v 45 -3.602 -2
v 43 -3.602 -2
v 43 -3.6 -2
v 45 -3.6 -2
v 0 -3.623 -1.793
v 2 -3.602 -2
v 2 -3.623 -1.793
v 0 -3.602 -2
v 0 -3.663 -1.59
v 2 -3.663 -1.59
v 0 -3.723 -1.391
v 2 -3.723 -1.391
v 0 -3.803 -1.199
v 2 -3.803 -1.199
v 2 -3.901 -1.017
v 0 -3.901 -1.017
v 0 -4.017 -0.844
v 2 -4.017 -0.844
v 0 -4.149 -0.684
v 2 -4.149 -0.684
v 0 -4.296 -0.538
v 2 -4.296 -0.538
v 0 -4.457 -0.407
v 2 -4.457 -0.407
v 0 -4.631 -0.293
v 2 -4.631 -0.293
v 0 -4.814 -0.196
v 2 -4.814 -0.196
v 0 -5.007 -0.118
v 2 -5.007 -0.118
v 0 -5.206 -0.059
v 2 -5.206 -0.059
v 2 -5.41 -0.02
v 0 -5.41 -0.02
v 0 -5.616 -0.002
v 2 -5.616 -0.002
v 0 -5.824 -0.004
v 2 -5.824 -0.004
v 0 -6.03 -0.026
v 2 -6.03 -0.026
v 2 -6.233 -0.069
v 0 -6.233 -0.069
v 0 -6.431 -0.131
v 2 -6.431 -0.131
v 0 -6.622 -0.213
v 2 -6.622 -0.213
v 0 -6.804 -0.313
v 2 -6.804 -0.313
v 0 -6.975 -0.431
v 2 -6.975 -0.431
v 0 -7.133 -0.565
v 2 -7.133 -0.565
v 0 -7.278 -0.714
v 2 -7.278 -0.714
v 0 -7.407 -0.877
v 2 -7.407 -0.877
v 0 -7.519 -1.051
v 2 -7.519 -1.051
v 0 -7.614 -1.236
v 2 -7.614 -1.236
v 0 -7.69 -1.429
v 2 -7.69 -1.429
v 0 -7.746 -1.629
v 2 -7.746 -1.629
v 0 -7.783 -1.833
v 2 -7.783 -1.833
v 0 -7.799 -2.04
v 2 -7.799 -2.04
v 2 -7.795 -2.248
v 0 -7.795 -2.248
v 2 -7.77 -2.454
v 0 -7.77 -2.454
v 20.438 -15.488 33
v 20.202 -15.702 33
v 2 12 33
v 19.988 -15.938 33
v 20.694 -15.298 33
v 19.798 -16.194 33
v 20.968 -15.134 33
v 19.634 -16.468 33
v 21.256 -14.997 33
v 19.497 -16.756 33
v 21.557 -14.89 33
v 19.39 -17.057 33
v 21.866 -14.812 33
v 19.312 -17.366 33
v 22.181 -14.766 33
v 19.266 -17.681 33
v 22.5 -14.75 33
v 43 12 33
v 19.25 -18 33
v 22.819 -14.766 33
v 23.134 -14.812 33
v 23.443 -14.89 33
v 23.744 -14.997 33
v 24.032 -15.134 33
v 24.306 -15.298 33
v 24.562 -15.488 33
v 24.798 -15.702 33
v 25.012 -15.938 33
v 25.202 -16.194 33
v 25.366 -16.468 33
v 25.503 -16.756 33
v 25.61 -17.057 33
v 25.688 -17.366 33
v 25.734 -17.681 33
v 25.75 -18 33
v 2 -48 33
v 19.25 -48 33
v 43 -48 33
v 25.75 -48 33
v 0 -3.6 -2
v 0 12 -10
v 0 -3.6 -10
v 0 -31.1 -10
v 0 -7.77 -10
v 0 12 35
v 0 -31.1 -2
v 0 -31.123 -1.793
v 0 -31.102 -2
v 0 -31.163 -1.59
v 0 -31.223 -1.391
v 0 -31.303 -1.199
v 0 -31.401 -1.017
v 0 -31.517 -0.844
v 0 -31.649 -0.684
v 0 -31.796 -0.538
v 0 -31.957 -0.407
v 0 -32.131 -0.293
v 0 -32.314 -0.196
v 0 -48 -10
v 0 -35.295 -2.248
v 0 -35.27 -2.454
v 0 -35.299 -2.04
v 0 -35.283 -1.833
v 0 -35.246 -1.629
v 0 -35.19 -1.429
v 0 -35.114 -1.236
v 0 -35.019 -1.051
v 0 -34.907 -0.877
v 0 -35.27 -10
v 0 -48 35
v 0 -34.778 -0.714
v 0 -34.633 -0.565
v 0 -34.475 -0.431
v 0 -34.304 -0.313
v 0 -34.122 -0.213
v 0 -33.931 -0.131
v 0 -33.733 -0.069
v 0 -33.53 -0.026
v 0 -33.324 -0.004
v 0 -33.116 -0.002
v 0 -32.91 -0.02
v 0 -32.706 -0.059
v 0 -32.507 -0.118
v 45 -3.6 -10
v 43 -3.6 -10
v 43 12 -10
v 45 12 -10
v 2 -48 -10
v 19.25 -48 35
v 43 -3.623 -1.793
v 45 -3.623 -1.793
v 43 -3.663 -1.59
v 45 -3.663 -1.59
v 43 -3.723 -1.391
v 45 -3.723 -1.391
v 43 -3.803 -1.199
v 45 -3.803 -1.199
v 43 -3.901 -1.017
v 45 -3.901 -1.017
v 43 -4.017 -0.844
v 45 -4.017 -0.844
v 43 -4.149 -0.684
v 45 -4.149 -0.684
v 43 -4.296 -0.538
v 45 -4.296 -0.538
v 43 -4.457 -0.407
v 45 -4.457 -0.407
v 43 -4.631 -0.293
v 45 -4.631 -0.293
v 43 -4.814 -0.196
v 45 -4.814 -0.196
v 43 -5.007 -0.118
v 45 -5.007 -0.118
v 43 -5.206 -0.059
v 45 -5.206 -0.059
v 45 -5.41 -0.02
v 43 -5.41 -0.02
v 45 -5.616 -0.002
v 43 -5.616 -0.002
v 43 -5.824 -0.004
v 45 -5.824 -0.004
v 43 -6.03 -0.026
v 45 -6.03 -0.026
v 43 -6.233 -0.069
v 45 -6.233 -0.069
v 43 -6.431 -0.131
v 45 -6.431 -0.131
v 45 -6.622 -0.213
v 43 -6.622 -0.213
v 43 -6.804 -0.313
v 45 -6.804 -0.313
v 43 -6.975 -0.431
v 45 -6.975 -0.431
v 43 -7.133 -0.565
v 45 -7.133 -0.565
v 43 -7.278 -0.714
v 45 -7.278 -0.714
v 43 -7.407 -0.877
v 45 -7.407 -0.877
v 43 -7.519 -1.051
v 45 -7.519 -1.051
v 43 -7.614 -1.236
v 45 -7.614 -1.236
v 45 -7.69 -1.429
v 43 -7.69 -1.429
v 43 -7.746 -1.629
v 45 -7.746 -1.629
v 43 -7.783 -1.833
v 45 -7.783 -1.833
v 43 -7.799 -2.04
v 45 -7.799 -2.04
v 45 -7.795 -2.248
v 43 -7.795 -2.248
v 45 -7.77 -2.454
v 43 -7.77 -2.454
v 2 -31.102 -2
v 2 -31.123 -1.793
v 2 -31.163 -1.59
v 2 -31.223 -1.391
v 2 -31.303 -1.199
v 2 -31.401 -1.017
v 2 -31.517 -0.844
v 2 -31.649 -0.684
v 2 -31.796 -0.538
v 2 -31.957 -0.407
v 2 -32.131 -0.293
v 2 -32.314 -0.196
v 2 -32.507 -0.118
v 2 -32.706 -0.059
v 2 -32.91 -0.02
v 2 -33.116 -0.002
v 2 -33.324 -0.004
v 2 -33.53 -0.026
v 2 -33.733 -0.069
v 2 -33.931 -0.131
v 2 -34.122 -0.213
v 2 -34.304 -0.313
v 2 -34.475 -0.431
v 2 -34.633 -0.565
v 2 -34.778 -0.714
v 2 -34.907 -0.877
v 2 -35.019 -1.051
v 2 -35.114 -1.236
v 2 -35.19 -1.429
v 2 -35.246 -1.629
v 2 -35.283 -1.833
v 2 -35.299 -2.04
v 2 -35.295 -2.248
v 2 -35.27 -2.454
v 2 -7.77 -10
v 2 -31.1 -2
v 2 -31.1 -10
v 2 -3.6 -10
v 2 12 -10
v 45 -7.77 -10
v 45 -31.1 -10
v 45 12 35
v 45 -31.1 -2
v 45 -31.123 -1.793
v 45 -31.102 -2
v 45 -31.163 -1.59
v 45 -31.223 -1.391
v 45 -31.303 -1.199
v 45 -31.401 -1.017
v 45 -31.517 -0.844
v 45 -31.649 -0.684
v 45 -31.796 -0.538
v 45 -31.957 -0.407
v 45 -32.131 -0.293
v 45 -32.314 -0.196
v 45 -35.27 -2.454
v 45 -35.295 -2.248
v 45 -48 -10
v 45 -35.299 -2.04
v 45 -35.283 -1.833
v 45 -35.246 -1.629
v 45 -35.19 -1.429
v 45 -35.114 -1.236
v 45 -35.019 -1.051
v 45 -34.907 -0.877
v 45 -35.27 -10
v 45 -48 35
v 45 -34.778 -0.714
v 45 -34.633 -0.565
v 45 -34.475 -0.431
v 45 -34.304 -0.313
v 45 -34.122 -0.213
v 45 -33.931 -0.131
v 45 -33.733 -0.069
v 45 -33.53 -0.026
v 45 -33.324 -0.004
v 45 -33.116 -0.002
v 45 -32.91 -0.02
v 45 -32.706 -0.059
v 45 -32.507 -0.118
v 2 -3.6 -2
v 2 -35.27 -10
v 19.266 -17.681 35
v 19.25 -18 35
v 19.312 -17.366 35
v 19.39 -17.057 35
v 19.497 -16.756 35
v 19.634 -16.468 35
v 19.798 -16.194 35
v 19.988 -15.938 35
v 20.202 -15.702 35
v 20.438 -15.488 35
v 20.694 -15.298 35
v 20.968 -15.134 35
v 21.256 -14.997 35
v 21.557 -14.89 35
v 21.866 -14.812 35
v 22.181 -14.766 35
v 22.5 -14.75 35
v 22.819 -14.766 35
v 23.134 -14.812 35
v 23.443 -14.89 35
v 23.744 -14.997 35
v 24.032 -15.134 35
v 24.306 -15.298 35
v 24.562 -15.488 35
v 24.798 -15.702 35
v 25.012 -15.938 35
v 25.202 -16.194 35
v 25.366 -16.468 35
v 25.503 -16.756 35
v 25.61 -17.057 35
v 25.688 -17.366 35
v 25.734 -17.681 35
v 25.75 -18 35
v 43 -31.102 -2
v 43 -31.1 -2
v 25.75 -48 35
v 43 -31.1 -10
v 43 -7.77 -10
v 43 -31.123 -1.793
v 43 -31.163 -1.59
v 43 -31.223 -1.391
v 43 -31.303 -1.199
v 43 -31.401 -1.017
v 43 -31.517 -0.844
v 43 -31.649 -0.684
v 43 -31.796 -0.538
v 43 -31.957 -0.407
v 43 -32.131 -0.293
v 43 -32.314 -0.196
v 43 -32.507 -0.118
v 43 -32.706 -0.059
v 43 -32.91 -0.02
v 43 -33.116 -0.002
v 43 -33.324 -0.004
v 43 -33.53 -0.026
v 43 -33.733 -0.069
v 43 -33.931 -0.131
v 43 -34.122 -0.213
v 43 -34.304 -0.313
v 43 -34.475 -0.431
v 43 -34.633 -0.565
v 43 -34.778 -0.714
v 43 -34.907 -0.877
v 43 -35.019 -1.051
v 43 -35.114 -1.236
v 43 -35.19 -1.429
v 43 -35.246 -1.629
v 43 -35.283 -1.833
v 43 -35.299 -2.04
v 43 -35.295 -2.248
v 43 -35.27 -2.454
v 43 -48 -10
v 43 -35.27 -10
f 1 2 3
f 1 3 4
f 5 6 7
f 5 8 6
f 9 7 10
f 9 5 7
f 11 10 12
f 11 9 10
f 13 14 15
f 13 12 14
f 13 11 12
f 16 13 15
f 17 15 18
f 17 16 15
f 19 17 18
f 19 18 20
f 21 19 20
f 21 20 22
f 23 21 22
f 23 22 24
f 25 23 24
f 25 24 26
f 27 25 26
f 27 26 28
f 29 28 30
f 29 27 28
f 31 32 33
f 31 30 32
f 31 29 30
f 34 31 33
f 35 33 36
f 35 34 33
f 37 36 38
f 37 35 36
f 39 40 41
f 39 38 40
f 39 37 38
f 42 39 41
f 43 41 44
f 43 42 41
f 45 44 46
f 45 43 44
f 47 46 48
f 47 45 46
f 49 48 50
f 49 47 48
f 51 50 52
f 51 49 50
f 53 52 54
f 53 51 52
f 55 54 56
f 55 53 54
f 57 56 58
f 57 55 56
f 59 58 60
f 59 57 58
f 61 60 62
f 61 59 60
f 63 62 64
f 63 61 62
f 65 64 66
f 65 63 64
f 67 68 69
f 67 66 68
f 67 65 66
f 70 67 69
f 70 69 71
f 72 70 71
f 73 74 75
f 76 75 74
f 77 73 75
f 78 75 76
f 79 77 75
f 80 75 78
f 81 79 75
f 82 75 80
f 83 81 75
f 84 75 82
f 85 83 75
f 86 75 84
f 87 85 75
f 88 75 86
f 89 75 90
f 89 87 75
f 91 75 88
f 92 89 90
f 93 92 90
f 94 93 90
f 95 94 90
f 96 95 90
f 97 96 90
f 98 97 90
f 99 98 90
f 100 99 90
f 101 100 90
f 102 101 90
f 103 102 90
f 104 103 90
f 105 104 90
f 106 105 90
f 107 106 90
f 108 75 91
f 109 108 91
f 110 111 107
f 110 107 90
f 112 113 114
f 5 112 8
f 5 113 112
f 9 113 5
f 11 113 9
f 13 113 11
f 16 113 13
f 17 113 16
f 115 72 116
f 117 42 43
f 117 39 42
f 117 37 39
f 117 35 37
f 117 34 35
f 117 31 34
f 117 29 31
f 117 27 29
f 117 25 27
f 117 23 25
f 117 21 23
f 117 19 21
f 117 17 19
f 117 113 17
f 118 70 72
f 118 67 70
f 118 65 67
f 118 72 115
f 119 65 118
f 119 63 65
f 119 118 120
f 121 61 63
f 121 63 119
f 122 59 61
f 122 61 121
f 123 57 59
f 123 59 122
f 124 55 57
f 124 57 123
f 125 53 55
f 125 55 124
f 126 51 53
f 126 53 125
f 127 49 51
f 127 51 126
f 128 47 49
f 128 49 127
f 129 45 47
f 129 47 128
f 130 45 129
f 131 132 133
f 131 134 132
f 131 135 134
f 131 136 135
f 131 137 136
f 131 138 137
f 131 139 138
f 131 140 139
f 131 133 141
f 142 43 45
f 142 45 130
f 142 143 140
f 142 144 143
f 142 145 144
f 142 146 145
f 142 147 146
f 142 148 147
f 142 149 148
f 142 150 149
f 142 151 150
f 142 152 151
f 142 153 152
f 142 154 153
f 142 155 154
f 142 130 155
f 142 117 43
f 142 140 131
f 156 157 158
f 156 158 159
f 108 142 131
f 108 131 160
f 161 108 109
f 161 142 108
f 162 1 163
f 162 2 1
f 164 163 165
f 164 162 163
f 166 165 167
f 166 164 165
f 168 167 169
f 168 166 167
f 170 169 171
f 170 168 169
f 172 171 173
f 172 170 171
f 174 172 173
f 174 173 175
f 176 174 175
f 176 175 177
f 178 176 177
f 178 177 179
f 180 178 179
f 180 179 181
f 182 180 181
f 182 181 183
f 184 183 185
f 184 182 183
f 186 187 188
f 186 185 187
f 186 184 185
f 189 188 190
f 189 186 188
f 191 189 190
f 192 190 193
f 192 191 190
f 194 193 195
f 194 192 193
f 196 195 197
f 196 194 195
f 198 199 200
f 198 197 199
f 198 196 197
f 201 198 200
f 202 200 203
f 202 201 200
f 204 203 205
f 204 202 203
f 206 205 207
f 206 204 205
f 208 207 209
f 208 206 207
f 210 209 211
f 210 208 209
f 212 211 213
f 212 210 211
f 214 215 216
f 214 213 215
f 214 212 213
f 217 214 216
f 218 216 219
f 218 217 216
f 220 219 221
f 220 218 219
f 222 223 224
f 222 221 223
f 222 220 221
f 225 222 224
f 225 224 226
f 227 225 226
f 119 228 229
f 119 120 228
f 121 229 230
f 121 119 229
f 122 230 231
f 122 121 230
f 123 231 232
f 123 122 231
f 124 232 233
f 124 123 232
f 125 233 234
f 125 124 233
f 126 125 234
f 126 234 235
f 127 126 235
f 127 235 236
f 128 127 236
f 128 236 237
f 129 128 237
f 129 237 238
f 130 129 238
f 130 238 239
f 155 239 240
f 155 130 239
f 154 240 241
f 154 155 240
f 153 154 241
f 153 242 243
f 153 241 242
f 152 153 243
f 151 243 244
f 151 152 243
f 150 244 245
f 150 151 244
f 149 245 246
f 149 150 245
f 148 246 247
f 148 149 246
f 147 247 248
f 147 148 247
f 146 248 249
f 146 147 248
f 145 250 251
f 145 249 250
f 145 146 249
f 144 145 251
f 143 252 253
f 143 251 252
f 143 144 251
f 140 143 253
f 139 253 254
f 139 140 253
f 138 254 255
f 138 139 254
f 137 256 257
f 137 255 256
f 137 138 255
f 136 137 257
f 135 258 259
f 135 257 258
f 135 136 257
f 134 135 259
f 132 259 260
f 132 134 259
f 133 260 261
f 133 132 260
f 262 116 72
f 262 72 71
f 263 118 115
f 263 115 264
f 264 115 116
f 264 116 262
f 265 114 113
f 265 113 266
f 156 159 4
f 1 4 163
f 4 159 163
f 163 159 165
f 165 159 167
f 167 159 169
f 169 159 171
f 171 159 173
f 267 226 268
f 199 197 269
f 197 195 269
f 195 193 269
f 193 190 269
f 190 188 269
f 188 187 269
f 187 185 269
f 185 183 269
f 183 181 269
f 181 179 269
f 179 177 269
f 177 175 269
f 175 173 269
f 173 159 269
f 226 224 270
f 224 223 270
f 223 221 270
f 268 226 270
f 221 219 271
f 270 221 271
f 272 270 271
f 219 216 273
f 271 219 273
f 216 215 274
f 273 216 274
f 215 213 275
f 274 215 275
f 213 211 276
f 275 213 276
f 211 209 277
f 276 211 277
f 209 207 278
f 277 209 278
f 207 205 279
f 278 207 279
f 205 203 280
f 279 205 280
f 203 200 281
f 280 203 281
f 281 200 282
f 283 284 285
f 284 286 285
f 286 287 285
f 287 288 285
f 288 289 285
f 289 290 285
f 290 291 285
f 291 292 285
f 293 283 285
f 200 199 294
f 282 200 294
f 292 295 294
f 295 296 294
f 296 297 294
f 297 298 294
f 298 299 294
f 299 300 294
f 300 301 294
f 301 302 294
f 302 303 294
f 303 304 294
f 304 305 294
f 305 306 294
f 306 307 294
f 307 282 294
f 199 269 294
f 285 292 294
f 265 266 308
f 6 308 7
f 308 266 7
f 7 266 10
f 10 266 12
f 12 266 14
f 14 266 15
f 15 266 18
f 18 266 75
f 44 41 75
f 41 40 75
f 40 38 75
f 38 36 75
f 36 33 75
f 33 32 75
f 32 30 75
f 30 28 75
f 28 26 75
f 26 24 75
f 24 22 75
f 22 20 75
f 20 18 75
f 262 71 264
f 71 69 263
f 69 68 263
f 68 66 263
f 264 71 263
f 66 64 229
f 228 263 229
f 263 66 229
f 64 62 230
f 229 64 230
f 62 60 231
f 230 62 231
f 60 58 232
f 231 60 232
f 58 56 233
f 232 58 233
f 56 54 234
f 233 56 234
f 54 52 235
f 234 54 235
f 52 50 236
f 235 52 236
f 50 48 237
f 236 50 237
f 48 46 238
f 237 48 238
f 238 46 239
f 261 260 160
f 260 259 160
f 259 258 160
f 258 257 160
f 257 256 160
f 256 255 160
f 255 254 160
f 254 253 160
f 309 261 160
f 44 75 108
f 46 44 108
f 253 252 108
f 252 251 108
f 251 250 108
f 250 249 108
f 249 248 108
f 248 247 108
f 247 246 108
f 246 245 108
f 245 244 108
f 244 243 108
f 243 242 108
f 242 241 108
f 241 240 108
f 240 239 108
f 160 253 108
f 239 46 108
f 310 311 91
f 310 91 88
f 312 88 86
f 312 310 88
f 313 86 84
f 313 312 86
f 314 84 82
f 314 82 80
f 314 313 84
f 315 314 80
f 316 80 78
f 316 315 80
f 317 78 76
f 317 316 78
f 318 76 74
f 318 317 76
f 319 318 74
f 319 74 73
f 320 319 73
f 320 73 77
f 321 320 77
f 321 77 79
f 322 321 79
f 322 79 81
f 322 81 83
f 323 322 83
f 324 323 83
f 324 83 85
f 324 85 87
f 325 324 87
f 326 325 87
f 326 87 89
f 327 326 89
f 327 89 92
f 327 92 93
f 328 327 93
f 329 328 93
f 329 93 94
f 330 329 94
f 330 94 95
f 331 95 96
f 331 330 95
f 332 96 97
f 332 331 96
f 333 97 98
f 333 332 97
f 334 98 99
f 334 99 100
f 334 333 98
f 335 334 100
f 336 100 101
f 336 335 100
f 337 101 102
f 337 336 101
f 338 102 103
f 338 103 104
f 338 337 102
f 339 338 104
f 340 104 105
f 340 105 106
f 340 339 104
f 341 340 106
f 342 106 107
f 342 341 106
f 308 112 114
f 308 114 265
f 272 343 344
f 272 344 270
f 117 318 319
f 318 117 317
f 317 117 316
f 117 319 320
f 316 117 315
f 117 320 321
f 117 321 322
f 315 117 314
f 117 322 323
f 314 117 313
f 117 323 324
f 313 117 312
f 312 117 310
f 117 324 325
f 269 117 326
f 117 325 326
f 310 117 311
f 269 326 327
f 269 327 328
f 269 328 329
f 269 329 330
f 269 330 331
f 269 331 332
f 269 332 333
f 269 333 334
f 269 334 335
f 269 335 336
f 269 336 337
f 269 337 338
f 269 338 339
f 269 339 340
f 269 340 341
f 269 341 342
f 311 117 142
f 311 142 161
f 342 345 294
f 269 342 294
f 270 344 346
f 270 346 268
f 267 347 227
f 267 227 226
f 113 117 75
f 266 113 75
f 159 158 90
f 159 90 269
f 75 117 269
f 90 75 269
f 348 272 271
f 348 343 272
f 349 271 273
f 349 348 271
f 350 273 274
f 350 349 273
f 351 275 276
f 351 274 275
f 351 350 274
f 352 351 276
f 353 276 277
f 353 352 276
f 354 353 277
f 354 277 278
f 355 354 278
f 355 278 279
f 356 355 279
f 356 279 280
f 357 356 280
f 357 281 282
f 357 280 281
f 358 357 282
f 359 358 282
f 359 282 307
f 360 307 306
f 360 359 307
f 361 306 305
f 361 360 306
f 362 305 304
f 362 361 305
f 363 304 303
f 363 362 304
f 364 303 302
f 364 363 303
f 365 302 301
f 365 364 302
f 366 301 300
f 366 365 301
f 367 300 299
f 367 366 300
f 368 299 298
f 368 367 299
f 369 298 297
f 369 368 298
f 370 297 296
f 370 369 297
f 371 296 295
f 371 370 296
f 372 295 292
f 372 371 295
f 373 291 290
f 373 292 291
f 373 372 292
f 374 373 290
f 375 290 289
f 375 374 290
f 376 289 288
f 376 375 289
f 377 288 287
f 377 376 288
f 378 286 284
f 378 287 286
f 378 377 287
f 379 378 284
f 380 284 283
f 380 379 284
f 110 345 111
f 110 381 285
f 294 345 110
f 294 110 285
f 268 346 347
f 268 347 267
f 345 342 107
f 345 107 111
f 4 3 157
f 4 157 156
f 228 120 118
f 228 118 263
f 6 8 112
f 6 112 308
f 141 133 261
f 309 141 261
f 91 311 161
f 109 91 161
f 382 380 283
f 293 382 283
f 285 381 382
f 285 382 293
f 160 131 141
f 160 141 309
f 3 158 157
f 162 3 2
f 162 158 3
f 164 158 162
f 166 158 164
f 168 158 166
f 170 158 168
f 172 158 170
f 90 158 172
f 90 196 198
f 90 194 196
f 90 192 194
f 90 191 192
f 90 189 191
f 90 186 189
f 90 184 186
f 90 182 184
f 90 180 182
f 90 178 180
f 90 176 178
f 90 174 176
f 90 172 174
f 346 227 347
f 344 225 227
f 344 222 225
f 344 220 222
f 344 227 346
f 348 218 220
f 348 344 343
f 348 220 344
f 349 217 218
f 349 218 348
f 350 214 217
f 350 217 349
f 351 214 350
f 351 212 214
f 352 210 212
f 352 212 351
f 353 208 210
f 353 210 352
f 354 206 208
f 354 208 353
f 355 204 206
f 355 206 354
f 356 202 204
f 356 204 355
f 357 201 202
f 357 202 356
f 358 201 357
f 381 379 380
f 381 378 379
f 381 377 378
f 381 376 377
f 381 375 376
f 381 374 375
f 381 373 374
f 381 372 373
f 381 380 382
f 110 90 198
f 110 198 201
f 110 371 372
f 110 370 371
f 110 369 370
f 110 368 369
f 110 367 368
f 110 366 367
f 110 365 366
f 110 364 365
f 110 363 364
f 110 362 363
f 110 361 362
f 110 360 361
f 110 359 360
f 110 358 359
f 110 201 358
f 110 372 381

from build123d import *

# Parameters (mm, degrees)
BOX006_W                = 2
BOX006_H                = 4.17
BOX006_DEPTH            = 13
ARRAY003_X_COUNT        = 2
ARRAY003_X_PITCH        = 43
ARRAY003_Y_COUNT        = 2
ARRAY003_Y_PITCH        = 27.5
CYLINDER002_R           = 2.1
CYLINDER002_DEPTH       = 2
CYLINDER002_PITCH_ANGLE = 90
ARRAY002_X_COUNT        = 2
ARRAY002_X_PITCH        = 43
ARRAY002_Y_COUNT        = 2
ARRAY002_Y_PITCH        = 27.5
CYLINDER003_R           = 3.25
CYLINDER003_DEPTH       = 2
BOX007_W                = 6.5
BOX007_H                = 36
BOX007_DEPTH            = 2
BOX003_W                = 45
BOX003_H                = 60
BOX003_DEPTH            = 2
BOX005_W                = 2
BOX005_H                = 60
BOX005_DEPTH            = 45
BOX004_W                = 2
BOX004_H                = 60
BOX004_DEPTH            = 45
CUT003_PLACEMENT_ANGLE  = 180


with BuildPart() as array003:
    # Box006 → Box006 (new body)
    with BuildSketch(Plane(origin=(0, 15.6, 37), x_dir=(1, 0, 0), z_dir=(0, 0, 1))):
        with Locations((1, 2.085)):
            Rectangle(BOX006_W, BOX006_H)
    extrude(amount=BOX006_DEPTH)

    # Array003 X: Array003 ×2


with BuildPart() as array003_1:
    add(array003.part)
    with Locations(*[(i * ARRAY003_X_PITCH, 0, 0) for i in range(1, ARRAY003_X_COUNT)]):
        add(array003.part)

    # Array003 Y: Array003 ×2


with BuildPart() as array003_2:
    add(array003_1.part)
    with Locations(*[(0, i * ARRAY003_Y_PITCH, 0) for i in range(1, ARRAY003_Y_COUNT)]):
        add(array003_1.part)


with BuildPart() as fusion003:
    # Cylinder002 → Cylinder002 (new body)
    with BuildSketch(Plane.XY):
        Circle(CYLINDER002_R)
    extrude(amount=CYLINDER002_DEPTH)


with BuildPart() as fusion003_1:
    # Cylinder002 pitch: moved
    add(fusion003.part.rotate(Axis((0, 0, 0), (0, 1, 0)), CYLINDER002_PITCH_ANGLE))


with BuildPart() as fusion003_2:
    # Cylinder002 placement: moved
    add(fusion003_1.part.moved(Location((0, 17.7, 37.1))))

    # Array002 X: Fusion003 ×2


with BuildPart() as fusion003_3:
    add(fusion003_2.part)
    with Locations(*[(i * ARRAY002_X_PITCH, 0, 0) for i in range(1, ARRAY002_X_COUNT)]):
        add(fusion003_2.part)

    # Array002 Y: Fusion003 ×2


with BuildPart() as fusion003_4:
    add(fusion003_3.part)
    with Locations(*[(0, i * ARRAY002_Y_PITCH, 0) for i in range(1, ARRAY002_Y_COUNT)]):
        add(fusion003_3.part)

    # Fusion003: union Array003
    add(array003_2.part)


with BuildPart() as cilindro003:
    # Cylinder003 → Cylinder003 (new body)
    with BuildSketch(Plane(origin=(22.5, 30, 0), x_dir=(1, 0, 0), z_dir=(0, 0, 1))):
        Circle(CYLINDER003_R)
    extrude(amount=CYLINDER003_DEPTH)


with BuildPart() as fusion004:
    # Box007 → Box007 (new body)
    with BuildSketch(Plane(origin=(19.25, 30, 0), x_dir=(1, 0, 0), z_dir=(0, 0, 1))):
        with Locations((3.25, 18)):
            Rectangle(BOX007_W, BOX007_H)
    extrude(amount=BOX007_DEPTH)

    # Fusion002: union Cilindro003
    add(cilindro003.part)

    # Fusion004: union Fusion003
    add(fusion003_4.part)


with BuildPart() as pared_inferior:
    # Box003 → Box003 (new body)
    with BuildSketch(Plane.XY):
        with Locations((22.5, 30)):
            Rectangle(BOX003_W, BOX003_H)
    extrude(amount=BOX003_DEPTH)


with BuildPart() as pared_izquierda:
    # Box005 → Box005 (new body)
    with BuildSketch(Plane(origin=(43, 0, 0), x_dir=(1, 0, 0), z_dir=(0, 0, 1))):
        with Locations((1, 30)):
            Rectangle(BOX005_W, BOX005_H)
    extrude(amount=BOX005_DEPTH)


with BuildPart() as sujeccion_superior_brazo:
    # Box004 → Box004 (new body)
    with BuildSketch(Plane.XY):
        with Locations((1, 30)):
            Rectangle(BOX004_W, BOX004_H)
    extrude(amount=BOX004_DEPTH)

    # Fusion001: union pared inferior, pared izquierda
    add(pared_inferior.part)
    add(pared_izquierda.part)

    # Cut003: cut Fusion004
    add(fusion004.part, mode=Mode.SUBTRACT)


with BuildPart() as sujeccion_superior_brazo_1:
    # Cut003 placement: moved
    add(sujeccion_superior_brazo.part.moved(Location((0, 12, 35))).rotate(Axis((0, 12, 35), (1, 0, 0)), CUT003_PLACEMENT_ANGLE))


solid = sujeccion_superior_brazo_1.part
